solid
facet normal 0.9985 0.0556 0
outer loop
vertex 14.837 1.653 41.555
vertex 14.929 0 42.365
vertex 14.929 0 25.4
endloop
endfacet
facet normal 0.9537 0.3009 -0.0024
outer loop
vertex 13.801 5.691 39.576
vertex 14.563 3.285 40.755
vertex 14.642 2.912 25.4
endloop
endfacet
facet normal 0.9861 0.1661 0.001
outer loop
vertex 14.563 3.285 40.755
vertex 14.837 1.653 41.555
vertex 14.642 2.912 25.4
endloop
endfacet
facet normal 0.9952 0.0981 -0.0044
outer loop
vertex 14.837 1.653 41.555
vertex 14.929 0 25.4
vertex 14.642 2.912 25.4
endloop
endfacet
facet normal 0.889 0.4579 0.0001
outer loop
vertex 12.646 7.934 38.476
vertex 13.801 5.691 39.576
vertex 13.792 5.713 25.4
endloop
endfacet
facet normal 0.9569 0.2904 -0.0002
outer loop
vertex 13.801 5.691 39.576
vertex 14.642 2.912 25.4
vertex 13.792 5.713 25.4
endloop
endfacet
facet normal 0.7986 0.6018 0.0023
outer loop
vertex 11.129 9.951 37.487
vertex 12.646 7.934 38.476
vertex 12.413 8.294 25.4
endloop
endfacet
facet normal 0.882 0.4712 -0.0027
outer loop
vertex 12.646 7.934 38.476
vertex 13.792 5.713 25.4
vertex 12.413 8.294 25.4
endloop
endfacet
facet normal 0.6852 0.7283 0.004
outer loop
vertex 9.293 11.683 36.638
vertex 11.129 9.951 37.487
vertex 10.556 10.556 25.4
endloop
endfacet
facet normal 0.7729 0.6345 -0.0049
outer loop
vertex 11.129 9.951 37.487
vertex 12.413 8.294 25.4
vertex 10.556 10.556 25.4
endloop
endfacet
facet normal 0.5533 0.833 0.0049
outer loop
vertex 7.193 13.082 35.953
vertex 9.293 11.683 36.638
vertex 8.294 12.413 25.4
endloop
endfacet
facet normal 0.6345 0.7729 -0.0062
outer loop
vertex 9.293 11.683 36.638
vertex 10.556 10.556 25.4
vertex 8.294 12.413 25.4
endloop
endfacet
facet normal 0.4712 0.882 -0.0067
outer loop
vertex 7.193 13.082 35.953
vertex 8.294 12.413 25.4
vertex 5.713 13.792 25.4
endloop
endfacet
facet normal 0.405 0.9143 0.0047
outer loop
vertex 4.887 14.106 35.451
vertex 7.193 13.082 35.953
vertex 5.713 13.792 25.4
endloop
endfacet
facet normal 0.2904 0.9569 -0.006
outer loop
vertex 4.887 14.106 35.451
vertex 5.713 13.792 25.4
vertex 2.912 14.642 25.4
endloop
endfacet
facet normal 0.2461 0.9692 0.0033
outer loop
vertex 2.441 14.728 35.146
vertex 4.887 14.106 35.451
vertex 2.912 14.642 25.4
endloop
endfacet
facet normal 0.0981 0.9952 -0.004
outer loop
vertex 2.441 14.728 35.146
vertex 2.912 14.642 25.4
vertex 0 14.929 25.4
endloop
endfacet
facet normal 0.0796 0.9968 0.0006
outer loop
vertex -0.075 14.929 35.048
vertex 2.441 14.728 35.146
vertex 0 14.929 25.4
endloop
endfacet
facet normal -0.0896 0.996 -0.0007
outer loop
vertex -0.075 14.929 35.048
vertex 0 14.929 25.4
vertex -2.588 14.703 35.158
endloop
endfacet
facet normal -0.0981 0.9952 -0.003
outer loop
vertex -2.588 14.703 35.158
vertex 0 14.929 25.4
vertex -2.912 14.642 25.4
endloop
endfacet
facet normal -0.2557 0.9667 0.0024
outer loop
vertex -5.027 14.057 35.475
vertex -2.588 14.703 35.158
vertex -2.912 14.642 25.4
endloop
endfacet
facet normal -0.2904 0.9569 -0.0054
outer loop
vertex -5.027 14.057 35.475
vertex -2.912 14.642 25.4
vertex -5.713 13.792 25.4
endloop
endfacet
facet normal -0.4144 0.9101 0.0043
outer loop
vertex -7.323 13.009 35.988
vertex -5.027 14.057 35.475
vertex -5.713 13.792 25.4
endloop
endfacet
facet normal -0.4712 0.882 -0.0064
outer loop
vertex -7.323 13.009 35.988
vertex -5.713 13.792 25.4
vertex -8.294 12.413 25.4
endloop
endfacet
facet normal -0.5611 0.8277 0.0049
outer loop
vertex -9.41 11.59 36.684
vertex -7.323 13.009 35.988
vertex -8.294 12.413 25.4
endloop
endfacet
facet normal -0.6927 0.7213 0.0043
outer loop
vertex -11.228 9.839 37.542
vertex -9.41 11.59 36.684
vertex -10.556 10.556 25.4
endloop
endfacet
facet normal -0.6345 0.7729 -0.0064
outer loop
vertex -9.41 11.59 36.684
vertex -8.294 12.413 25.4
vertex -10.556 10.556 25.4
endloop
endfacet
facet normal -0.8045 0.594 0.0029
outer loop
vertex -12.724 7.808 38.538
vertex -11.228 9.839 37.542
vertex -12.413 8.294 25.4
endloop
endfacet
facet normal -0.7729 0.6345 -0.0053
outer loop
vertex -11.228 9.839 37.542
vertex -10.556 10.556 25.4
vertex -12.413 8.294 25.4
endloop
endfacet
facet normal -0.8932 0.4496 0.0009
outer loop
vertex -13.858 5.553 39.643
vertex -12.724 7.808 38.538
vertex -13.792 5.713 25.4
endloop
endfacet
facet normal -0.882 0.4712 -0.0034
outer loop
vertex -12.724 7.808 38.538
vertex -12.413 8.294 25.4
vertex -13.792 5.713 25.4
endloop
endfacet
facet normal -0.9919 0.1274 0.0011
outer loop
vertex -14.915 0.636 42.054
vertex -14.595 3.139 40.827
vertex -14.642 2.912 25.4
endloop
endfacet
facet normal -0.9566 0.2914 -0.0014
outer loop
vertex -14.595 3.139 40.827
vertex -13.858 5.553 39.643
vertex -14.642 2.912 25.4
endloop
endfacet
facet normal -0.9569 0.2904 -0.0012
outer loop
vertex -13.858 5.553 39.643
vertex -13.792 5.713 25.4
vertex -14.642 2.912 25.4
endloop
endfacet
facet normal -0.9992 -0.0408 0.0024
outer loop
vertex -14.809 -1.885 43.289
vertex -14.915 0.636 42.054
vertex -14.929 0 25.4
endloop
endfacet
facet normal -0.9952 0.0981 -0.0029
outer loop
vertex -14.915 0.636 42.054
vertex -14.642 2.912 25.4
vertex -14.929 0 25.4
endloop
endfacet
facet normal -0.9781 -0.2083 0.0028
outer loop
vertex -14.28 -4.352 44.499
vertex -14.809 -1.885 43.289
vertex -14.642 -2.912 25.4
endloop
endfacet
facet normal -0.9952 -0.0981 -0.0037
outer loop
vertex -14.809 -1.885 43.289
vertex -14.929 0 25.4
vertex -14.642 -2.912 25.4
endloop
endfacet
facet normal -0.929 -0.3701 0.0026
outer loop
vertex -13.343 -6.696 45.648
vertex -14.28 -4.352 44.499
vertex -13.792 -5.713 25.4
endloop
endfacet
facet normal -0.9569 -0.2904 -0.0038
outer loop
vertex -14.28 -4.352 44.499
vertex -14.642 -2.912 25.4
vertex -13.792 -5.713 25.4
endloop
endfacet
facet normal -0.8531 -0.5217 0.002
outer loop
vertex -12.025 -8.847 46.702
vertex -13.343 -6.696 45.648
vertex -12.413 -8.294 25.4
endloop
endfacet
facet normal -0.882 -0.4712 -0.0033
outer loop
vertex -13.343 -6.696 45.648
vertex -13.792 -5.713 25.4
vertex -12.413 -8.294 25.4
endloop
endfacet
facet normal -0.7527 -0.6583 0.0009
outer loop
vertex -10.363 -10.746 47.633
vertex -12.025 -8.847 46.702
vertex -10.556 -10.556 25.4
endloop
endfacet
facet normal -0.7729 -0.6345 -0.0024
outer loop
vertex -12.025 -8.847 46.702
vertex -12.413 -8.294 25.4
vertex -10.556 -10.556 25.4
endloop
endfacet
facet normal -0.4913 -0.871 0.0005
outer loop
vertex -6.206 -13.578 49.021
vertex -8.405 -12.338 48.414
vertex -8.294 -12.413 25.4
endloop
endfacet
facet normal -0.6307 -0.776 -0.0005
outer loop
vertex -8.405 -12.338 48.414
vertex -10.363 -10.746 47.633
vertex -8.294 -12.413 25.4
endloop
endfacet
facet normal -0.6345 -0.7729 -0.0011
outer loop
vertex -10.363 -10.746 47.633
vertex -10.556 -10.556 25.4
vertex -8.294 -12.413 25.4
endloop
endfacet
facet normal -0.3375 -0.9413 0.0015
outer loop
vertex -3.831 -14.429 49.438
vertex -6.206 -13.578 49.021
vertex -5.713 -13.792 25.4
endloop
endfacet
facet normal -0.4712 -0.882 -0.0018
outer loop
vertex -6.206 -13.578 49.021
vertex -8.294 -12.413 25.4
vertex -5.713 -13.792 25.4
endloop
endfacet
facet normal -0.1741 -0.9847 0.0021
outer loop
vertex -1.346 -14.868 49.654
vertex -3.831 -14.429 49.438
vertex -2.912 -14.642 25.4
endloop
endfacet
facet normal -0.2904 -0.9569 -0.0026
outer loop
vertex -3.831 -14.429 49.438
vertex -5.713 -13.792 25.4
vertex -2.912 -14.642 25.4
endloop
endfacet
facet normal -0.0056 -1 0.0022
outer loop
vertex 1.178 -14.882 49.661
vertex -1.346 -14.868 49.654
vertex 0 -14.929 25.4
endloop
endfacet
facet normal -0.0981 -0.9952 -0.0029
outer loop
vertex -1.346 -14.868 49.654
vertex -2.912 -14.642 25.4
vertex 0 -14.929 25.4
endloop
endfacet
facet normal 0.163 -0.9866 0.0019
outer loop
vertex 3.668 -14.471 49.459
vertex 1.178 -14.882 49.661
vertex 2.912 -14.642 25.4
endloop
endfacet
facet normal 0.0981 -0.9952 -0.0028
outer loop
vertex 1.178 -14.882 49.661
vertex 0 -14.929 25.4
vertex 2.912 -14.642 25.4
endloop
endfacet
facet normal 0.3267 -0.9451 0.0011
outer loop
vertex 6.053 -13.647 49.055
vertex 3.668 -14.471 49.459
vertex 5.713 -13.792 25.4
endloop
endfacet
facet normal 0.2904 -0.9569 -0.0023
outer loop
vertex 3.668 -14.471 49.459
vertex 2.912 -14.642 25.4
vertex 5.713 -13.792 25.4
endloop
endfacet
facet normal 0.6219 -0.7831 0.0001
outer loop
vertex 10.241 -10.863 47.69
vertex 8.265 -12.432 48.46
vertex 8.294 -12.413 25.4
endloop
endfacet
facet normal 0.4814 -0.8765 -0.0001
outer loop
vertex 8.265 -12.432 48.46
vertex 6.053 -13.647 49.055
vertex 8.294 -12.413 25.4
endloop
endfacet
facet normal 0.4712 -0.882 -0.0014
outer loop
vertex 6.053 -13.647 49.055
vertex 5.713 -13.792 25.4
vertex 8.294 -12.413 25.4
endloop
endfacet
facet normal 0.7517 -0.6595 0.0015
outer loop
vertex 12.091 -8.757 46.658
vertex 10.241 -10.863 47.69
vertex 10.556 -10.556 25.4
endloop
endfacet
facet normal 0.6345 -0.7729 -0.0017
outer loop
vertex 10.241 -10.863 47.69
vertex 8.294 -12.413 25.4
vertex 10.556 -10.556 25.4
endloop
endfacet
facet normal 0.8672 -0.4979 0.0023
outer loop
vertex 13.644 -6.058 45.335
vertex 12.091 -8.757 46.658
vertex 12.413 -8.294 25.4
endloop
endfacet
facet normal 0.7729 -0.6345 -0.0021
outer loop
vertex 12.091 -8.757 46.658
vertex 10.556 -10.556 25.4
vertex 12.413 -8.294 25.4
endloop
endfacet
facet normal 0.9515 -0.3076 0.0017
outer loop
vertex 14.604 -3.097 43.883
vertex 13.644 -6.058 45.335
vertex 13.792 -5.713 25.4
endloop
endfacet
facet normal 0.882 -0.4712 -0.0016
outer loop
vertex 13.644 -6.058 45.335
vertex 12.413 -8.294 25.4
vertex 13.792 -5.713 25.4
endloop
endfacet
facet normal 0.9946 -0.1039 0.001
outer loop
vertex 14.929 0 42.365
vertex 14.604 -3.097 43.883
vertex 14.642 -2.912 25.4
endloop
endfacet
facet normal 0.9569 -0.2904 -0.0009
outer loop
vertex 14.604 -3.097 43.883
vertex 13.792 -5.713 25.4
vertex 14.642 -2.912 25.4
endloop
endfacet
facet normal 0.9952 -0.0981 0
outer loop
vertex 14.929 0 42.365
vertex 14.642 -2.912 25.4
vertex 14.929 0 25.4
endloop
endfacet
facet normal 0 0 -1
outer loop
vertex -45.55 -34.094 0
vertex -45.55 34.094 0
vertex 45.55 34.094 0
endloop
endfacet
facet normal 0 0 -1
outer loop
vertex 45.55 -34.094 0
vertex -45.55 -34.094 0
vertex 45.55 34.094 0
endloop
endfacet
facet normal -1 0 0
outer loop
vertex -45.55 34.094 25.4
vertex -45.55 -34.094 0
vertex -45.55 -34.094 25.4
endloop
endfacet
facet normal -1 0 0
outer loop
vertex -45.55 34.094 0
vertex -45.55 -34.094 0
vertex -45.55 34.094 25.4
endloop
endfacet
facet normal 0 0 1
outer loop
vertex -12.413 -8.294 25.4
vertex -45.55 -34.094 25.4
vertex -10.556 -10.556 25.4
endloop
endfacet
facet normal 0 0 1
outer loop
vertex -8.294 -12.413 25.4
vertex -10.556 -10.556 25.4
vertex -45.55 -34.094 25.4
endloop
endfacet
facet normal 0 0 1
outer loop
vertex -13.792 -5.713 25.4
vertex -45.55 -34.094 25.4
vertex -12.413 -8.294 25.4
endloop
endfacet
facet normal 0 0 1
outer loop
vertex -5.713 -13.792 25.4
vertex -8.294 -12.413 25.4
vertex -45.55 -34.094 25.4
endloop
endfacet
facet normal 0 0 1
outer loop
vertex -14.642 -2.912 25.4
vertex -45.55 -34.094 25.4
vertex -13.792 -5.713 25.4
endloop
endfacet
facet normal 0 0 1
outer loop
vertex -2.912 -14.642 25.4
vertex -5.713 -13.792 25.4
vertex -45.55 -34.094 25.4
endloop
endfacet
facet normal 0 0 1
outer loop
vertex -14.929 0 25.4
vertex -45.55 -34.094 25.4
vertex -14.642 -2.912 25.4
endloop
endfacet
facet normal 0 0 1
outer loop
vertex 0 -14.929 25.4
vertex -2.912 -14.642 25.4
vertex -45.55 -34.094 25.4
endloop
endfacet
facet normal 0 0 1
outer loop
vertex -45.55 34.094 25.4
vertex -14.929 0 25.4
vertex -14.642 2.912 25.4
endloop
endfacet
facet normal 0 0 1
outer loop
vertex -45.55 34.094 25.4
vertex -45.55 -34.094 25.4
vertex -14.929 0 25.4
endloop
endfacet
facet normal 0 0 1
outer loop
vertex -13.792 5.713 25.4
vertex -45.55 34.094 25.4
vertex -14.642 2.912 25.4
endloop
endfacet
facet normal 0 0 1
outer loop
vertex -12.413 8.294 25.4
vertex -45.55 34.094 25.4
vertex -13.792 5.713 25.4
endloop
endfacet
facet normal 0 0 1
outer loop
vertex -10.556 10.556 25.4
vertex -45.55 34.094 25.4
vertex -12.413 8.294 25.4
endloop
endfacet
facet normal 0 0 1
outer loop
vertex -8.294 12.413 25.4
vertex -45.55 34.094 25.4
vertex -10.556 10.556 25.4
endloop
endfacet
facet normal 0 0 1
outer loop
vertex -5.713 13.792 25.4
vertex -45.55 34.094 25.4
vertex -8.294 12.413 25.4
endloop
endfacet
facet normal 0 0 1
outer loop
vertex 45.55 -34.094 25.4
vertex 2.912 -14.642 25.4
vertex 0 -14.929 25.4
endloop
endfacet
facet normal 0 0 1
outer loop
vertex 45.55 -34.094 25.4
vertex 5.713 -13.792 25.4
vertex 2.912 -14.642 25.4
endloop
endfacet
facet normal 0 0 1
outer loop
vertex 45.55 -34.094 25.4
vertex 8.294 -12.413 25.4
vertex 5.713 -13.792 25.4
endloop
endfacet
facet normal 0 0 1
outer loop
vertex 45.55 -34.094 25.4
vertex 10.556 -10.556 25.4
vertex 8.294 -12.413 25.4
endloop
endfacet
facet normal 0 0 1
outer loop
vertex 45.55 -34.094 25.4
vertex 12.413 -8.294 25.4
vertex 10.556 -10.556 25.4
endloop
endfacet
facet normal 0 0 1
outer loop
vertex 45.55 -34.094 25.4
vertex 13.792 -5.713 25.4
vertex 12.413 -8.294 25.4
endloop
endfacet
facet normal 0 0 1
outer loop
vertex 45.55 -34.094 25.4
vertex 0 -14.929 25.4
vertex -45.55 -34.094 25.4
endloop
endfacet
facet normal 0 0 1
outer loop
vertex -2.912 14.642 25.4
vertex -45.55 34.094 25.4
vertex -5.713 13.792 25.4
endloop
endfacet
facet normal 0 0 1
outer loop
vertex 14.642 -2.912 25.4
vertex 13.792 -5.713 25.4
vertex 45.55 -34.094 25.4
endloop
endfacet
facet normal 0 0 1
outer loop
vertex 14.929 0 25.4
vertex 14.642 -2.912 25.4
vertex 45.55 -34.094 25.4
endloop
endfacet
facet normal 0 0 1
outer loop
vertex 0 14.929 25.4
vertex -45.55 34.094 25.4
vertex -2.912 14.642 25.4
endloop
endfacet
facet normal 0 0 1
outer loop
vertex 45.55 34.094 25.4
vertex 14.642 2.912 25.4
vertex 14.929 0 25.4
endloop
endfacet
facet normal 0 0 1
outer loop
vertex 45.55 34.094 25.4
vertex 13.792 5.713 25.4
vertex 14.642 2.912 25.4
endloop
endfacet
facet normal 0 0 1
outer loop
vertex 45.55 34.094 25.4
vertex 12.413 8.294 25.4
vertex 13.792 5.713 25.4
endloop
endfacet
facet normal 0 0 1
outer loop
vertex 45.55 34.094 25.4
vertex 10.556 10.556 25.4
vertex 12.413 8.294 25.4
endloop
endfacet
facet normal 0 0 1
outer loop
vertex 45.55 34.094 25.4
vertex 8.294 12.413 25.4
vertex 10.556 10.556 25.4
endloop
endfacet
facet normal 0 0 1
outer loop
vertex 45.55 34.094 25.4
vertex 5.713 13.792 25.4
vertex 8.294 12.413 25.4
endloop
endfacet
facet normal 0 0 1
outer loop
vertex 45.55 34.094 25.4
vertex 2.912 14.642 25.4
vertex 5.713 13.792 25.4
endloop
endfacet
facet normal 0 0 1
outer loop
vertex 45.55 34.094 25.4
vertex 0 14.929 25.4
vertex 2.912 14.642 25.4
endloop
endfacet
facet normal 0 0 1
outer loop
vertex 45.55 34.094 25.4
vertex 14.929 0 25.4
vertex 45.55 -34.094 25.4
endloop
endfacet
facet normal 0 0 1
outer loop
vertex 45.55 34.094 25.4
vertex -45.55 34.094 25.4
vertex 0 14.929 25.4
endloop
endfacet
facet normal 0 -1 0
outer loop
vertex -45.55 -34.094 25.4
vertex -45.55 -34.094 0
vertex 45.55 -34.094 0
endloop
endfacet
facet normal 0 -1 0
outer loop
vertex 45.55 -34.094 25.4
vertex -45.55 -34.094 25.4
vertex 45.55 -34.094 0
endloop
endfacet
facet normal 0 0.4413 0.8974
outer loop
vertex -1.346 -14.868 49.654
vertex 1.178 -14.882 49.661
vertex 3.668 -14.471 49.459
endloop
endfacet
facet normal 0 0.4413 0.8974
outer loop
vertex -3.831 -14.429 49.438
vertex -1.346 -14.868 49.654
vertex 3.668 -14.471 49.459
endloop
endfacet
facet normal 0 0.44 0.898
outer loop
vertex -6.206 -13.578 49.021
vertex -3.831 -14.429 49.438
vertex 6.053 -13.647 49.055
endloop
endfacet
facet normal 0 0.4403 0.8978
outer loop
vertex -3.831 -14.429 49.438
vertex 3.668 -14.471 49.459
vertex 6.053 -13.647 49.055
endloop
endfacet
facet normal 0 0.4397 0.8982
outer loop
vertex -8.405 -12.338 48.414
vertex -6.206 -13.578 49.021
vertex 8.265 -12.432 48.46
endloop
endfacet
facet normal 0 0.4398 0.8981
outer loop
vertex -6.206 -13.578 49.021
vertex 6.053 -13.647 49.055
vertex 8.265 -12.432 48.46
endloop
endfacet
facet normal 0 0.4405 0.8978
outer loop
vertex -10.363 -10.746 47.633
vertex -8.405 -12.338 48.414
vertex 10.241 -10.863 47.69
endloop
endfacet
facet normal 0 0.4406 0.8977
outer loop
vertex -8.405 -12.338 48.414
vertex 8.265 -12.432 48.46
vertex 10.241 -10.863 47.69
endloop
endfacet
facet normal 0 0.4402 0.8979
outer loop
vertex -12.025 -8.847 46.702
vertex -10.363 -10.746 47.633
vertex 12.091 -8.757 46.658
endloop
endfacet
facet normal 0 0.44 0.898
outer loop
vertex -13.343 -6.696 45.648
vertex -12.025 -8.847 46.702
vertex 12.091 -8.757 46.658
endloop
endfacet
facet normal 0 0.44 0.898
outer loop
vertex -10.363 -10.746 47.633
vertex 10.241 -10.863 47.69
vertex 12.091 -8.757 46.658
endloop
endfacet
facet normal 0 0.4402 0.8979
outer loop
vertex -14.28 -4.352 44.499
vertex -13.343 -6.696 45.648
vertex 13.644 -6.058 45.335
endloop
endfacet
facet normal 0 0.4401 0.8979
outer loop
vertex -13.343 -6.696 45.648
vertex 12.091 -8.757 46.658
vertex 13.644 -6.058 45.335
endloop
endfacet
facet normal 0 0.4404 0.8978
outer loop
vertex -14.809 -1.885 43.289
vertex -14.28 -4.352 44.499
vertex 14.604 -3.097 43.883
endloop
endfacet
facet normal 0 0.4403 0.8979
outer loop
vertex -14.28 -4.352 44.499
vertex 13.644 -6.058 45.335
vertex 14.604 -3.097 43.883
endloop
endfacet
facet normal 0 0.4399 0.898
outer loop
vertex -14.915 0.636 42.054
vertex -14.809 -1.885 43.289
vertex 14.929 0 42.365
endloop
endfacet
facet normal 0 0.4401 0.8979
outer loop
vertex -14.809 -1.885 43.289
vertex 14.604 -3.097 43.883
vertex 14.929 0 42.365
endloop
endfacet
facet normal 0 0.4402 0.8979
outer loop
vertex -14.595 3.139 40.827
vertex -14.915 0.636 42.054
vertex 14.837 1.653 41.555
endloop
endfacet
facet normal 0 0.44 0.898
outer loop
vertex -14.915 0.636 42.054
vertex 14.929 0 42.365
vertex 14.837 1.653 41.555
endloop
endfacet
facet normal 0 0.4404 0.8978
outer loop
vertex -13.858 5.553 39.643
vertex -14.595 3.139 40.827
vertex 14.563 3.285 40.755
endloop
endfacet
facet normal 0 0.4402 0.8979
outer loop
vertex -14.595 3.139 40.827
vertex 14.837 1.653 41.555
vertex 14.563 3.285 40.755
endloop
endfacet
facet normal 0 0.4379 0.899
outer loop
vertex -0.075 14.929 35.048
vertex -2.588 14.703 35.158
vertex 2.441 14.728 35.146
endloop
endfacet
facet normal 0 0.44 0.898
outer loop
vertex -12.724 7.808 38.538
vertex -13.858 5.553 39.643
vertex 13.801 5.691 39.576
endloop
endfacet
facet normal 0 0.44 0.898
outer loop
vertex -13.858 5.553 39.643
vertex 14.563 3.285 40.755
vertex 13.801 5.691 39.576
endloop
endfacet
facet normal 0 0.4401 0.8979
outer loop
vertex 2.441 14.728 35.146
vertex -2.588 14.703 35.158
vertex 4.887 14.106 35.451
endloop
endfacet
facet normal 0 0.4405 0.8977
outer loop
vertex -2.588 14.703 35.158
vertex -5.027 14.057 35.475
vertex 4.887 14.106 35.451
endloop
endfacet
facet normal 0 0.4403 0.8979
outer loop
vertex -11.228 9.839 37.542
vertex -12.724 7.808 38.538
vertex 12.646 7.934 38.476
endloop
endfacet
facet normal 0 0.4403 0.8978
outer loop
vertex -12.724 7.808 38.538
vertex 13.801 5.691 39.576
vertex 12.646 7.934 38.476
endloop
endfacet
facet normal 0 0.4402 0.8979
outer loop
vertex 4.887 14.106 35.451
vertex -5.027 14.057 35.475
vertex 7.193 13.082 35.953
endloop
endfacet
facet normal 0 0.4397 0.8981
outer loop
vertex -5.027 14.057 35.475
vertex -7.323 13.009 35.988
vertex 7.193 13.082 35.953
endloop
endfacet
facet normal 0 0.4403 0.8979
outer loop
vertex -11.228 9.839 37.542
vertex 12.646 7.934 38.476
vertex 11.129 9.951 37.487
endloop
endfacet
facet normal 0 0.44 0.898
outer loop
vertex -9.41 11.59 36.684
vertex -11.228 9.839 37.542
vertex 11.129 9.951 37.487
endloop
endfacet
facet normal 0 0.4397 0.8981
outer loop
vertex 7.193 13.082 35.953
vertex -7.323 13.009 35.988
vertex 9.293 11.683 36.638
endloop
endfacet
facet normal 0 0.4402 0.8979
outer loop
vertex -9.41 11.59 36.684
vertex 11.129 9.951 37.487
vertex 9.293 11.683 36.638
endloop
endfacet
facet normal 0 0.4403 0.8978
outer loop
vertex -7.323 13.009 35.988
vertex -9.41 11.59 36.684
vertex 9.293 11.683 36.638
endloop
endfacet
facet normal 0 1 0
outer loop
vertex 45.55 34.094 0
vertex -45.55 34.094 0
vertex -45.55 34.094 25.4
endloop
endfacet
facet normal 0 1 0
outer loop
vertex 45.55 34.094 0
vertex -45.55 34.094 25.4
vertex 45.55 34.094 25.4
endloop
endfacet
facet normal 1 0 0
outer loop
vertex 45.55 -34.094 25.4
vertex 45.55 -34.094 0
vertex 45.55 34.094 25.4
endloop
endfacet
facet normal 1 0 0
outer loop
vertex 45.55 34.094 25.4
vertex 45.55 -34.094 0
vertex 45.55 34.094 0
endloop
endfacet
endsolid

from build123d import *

# Parameters (mm, degrees)
F0_R     = 14.9287421436
F1_DEPTH = 38.1
F0_W     = 91.0995900631
F0_H     = 68.1872144341
F2_DEPTH = 25.4
F3_DEPTH = 12.7
F5_DEPTH = 25.4


with BuildPart() as f1:
    # F0 (on Top) → F1 (new body)
    with BuildSketch(Plane.XY):
        Circle(F0_R)
    extrude(amount=F1_DEPTH)

    # F0 (on Top) → F2 (join)
    with BuildSketch(Plane.XY):
        Rectangle(F0_W, F0_H)
        Circle(F0_R, mode=Mode.SUBTRACT)
    extrude(amount=F2_DEPTH)

    # F3 (add): a face of the model
    f3_faces = [f1.faces().sort_by_distance(p)[0] for p in [
        (0, 0, 38.1),
    ]]
    extrude(f3_faces, amount=F3_DEPTH)

    # F4 (on Right) → F5 (cut, symmetric)
    with BuildSketch(Plane.YZ):
        Polygon((-16.5885575116, 54.623093456), (-16.4052583277, 50.4072159529), (20.9877323359, 32.0773199201), (20.9877323359, 54.623093456), align=None)
    extrude(amount=F5_DEPTH, both=True, mode=Mode.SUBTRACT)


solid = f1.part
